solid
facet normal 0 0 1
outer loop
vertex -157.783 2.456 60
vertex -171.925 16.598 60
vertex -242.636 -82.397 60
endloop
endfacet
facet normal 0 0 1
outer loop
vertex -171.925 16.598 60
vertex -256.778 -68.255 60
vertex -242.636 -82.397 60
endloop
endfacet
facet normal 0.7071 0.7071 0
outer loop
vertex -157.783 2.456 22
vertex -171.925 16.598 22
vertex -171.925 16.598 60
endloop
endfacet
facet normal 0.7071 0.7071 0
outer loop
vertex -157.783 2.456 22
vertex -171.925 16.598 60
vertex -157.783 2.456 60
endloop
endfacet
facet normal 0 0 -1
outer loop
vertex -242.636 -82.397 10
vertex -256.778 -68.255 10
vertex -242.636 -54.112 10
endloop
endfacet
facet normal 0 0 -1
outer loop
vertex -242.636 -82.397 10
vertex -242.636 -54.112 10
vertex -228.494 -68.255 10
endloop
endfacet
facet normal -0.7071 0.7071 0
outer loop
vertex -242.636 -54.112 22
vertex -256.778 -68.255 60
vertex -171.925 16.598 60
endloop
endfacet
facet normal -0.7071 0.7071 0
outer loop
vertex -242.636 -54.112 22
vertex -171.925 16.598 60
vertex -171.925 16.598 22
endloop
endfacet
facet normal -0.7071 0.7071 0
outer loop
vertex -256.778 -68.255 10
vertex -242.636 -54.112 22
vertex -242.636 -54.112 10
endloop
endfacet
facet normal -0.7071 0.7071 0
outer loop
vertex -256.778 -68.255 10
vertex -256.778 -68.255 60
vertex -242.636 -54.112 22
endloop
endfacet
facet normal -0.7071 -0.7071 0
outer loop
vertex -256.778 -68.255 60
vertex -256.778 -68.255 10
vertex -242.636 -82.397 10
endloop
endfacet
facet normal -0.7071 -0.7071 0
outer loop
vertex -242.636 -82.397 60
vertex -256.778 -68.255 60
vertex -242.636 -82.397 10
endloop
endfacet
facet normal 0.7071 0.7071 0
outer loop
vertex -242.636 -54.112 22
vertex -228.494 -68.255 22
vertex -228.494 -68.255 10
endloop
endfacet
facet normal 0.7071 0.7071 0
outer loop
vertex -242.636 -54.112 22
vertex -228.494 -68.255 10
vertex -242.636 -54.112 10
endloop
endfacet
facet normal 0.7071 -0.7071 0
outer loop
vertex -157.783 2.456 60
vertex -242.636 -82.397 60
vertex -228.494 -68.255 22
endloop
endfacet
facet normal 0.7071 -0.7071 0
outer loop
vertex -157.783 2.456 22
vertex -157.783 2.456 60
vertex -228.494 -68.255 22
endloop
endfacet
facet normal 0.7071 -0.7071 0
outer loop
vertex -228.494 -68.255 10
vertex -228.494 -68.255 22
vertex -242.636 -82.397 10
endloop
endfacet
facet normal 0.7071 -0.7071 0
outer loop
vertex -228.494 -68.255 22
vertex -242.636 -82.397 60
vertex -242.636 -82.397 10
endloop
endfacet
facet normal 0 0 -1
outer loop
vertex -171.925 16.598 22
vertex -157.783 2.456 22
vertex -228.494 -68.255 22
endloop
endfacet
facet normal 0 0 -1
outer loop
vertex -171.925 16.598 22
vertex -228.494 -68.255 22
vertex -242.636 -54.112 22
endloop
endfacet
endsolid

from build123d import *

# Parameters (mm, degrees)
SKETCH041_W             = 20
SKETCH041_H             = 20
PAD030_DEPTH            = 50
PAD030_FACE1_W          = 20
PAD030_FACE1_H          = 50
PAD031_DEPTH            = 100
SKETCH043_W             = 20
SKETCH043_H             = 12
POCKET008_DEPTH         = 100
BODY003_PLACEMENT_ANGLE = 45


with BuildPart() as part:
    # Sketch041 → Pad030 (new body)
    with BuildSketch(Plane.XY):
        with Locations((-89.365005, -120.837763)):
            Rectangle(SKETCH041_W, SKETCH041_H)
    extrude(amount=PAD030_DEPTH)

    # Pad030 Face1 → Pad031 (add)
    with BuildSketch(Plane(origin=(-89.365005, -110.837763, 25), x_dir=(1, 0, 0), z_dir=(0, 1, 0))):
        Rectangle(PAD030_FACE1_W, PAD030_FACE1_H)
    extrude(amount=PAD031_DEPTH)

    # Sketch043 (on Face8 of Pad031) → Pocket008 (cut)
    with BuildSketch(Plane(origin=(0, -10.837763, 0), x_dir=(-1, 0, 0), z_dir=(0, 1, 0))):
        with Locations((89.365005, 6)):
            Rectangle(SKETCH043_W, SKETCH043_H)
    extrude(amount=-POCKET008_DEPTH, mode=Mode.SUBTRACT)


with BuildPart() as part_1:
    # Body003 placement: moved
    add(part.part.moved(Location((-94, -46, 10))).rotate(Axis((-94, -46, 10), (0, 0, -1)), BODY003_PLACEMENT_ANGLE))


solid = part_1.part
